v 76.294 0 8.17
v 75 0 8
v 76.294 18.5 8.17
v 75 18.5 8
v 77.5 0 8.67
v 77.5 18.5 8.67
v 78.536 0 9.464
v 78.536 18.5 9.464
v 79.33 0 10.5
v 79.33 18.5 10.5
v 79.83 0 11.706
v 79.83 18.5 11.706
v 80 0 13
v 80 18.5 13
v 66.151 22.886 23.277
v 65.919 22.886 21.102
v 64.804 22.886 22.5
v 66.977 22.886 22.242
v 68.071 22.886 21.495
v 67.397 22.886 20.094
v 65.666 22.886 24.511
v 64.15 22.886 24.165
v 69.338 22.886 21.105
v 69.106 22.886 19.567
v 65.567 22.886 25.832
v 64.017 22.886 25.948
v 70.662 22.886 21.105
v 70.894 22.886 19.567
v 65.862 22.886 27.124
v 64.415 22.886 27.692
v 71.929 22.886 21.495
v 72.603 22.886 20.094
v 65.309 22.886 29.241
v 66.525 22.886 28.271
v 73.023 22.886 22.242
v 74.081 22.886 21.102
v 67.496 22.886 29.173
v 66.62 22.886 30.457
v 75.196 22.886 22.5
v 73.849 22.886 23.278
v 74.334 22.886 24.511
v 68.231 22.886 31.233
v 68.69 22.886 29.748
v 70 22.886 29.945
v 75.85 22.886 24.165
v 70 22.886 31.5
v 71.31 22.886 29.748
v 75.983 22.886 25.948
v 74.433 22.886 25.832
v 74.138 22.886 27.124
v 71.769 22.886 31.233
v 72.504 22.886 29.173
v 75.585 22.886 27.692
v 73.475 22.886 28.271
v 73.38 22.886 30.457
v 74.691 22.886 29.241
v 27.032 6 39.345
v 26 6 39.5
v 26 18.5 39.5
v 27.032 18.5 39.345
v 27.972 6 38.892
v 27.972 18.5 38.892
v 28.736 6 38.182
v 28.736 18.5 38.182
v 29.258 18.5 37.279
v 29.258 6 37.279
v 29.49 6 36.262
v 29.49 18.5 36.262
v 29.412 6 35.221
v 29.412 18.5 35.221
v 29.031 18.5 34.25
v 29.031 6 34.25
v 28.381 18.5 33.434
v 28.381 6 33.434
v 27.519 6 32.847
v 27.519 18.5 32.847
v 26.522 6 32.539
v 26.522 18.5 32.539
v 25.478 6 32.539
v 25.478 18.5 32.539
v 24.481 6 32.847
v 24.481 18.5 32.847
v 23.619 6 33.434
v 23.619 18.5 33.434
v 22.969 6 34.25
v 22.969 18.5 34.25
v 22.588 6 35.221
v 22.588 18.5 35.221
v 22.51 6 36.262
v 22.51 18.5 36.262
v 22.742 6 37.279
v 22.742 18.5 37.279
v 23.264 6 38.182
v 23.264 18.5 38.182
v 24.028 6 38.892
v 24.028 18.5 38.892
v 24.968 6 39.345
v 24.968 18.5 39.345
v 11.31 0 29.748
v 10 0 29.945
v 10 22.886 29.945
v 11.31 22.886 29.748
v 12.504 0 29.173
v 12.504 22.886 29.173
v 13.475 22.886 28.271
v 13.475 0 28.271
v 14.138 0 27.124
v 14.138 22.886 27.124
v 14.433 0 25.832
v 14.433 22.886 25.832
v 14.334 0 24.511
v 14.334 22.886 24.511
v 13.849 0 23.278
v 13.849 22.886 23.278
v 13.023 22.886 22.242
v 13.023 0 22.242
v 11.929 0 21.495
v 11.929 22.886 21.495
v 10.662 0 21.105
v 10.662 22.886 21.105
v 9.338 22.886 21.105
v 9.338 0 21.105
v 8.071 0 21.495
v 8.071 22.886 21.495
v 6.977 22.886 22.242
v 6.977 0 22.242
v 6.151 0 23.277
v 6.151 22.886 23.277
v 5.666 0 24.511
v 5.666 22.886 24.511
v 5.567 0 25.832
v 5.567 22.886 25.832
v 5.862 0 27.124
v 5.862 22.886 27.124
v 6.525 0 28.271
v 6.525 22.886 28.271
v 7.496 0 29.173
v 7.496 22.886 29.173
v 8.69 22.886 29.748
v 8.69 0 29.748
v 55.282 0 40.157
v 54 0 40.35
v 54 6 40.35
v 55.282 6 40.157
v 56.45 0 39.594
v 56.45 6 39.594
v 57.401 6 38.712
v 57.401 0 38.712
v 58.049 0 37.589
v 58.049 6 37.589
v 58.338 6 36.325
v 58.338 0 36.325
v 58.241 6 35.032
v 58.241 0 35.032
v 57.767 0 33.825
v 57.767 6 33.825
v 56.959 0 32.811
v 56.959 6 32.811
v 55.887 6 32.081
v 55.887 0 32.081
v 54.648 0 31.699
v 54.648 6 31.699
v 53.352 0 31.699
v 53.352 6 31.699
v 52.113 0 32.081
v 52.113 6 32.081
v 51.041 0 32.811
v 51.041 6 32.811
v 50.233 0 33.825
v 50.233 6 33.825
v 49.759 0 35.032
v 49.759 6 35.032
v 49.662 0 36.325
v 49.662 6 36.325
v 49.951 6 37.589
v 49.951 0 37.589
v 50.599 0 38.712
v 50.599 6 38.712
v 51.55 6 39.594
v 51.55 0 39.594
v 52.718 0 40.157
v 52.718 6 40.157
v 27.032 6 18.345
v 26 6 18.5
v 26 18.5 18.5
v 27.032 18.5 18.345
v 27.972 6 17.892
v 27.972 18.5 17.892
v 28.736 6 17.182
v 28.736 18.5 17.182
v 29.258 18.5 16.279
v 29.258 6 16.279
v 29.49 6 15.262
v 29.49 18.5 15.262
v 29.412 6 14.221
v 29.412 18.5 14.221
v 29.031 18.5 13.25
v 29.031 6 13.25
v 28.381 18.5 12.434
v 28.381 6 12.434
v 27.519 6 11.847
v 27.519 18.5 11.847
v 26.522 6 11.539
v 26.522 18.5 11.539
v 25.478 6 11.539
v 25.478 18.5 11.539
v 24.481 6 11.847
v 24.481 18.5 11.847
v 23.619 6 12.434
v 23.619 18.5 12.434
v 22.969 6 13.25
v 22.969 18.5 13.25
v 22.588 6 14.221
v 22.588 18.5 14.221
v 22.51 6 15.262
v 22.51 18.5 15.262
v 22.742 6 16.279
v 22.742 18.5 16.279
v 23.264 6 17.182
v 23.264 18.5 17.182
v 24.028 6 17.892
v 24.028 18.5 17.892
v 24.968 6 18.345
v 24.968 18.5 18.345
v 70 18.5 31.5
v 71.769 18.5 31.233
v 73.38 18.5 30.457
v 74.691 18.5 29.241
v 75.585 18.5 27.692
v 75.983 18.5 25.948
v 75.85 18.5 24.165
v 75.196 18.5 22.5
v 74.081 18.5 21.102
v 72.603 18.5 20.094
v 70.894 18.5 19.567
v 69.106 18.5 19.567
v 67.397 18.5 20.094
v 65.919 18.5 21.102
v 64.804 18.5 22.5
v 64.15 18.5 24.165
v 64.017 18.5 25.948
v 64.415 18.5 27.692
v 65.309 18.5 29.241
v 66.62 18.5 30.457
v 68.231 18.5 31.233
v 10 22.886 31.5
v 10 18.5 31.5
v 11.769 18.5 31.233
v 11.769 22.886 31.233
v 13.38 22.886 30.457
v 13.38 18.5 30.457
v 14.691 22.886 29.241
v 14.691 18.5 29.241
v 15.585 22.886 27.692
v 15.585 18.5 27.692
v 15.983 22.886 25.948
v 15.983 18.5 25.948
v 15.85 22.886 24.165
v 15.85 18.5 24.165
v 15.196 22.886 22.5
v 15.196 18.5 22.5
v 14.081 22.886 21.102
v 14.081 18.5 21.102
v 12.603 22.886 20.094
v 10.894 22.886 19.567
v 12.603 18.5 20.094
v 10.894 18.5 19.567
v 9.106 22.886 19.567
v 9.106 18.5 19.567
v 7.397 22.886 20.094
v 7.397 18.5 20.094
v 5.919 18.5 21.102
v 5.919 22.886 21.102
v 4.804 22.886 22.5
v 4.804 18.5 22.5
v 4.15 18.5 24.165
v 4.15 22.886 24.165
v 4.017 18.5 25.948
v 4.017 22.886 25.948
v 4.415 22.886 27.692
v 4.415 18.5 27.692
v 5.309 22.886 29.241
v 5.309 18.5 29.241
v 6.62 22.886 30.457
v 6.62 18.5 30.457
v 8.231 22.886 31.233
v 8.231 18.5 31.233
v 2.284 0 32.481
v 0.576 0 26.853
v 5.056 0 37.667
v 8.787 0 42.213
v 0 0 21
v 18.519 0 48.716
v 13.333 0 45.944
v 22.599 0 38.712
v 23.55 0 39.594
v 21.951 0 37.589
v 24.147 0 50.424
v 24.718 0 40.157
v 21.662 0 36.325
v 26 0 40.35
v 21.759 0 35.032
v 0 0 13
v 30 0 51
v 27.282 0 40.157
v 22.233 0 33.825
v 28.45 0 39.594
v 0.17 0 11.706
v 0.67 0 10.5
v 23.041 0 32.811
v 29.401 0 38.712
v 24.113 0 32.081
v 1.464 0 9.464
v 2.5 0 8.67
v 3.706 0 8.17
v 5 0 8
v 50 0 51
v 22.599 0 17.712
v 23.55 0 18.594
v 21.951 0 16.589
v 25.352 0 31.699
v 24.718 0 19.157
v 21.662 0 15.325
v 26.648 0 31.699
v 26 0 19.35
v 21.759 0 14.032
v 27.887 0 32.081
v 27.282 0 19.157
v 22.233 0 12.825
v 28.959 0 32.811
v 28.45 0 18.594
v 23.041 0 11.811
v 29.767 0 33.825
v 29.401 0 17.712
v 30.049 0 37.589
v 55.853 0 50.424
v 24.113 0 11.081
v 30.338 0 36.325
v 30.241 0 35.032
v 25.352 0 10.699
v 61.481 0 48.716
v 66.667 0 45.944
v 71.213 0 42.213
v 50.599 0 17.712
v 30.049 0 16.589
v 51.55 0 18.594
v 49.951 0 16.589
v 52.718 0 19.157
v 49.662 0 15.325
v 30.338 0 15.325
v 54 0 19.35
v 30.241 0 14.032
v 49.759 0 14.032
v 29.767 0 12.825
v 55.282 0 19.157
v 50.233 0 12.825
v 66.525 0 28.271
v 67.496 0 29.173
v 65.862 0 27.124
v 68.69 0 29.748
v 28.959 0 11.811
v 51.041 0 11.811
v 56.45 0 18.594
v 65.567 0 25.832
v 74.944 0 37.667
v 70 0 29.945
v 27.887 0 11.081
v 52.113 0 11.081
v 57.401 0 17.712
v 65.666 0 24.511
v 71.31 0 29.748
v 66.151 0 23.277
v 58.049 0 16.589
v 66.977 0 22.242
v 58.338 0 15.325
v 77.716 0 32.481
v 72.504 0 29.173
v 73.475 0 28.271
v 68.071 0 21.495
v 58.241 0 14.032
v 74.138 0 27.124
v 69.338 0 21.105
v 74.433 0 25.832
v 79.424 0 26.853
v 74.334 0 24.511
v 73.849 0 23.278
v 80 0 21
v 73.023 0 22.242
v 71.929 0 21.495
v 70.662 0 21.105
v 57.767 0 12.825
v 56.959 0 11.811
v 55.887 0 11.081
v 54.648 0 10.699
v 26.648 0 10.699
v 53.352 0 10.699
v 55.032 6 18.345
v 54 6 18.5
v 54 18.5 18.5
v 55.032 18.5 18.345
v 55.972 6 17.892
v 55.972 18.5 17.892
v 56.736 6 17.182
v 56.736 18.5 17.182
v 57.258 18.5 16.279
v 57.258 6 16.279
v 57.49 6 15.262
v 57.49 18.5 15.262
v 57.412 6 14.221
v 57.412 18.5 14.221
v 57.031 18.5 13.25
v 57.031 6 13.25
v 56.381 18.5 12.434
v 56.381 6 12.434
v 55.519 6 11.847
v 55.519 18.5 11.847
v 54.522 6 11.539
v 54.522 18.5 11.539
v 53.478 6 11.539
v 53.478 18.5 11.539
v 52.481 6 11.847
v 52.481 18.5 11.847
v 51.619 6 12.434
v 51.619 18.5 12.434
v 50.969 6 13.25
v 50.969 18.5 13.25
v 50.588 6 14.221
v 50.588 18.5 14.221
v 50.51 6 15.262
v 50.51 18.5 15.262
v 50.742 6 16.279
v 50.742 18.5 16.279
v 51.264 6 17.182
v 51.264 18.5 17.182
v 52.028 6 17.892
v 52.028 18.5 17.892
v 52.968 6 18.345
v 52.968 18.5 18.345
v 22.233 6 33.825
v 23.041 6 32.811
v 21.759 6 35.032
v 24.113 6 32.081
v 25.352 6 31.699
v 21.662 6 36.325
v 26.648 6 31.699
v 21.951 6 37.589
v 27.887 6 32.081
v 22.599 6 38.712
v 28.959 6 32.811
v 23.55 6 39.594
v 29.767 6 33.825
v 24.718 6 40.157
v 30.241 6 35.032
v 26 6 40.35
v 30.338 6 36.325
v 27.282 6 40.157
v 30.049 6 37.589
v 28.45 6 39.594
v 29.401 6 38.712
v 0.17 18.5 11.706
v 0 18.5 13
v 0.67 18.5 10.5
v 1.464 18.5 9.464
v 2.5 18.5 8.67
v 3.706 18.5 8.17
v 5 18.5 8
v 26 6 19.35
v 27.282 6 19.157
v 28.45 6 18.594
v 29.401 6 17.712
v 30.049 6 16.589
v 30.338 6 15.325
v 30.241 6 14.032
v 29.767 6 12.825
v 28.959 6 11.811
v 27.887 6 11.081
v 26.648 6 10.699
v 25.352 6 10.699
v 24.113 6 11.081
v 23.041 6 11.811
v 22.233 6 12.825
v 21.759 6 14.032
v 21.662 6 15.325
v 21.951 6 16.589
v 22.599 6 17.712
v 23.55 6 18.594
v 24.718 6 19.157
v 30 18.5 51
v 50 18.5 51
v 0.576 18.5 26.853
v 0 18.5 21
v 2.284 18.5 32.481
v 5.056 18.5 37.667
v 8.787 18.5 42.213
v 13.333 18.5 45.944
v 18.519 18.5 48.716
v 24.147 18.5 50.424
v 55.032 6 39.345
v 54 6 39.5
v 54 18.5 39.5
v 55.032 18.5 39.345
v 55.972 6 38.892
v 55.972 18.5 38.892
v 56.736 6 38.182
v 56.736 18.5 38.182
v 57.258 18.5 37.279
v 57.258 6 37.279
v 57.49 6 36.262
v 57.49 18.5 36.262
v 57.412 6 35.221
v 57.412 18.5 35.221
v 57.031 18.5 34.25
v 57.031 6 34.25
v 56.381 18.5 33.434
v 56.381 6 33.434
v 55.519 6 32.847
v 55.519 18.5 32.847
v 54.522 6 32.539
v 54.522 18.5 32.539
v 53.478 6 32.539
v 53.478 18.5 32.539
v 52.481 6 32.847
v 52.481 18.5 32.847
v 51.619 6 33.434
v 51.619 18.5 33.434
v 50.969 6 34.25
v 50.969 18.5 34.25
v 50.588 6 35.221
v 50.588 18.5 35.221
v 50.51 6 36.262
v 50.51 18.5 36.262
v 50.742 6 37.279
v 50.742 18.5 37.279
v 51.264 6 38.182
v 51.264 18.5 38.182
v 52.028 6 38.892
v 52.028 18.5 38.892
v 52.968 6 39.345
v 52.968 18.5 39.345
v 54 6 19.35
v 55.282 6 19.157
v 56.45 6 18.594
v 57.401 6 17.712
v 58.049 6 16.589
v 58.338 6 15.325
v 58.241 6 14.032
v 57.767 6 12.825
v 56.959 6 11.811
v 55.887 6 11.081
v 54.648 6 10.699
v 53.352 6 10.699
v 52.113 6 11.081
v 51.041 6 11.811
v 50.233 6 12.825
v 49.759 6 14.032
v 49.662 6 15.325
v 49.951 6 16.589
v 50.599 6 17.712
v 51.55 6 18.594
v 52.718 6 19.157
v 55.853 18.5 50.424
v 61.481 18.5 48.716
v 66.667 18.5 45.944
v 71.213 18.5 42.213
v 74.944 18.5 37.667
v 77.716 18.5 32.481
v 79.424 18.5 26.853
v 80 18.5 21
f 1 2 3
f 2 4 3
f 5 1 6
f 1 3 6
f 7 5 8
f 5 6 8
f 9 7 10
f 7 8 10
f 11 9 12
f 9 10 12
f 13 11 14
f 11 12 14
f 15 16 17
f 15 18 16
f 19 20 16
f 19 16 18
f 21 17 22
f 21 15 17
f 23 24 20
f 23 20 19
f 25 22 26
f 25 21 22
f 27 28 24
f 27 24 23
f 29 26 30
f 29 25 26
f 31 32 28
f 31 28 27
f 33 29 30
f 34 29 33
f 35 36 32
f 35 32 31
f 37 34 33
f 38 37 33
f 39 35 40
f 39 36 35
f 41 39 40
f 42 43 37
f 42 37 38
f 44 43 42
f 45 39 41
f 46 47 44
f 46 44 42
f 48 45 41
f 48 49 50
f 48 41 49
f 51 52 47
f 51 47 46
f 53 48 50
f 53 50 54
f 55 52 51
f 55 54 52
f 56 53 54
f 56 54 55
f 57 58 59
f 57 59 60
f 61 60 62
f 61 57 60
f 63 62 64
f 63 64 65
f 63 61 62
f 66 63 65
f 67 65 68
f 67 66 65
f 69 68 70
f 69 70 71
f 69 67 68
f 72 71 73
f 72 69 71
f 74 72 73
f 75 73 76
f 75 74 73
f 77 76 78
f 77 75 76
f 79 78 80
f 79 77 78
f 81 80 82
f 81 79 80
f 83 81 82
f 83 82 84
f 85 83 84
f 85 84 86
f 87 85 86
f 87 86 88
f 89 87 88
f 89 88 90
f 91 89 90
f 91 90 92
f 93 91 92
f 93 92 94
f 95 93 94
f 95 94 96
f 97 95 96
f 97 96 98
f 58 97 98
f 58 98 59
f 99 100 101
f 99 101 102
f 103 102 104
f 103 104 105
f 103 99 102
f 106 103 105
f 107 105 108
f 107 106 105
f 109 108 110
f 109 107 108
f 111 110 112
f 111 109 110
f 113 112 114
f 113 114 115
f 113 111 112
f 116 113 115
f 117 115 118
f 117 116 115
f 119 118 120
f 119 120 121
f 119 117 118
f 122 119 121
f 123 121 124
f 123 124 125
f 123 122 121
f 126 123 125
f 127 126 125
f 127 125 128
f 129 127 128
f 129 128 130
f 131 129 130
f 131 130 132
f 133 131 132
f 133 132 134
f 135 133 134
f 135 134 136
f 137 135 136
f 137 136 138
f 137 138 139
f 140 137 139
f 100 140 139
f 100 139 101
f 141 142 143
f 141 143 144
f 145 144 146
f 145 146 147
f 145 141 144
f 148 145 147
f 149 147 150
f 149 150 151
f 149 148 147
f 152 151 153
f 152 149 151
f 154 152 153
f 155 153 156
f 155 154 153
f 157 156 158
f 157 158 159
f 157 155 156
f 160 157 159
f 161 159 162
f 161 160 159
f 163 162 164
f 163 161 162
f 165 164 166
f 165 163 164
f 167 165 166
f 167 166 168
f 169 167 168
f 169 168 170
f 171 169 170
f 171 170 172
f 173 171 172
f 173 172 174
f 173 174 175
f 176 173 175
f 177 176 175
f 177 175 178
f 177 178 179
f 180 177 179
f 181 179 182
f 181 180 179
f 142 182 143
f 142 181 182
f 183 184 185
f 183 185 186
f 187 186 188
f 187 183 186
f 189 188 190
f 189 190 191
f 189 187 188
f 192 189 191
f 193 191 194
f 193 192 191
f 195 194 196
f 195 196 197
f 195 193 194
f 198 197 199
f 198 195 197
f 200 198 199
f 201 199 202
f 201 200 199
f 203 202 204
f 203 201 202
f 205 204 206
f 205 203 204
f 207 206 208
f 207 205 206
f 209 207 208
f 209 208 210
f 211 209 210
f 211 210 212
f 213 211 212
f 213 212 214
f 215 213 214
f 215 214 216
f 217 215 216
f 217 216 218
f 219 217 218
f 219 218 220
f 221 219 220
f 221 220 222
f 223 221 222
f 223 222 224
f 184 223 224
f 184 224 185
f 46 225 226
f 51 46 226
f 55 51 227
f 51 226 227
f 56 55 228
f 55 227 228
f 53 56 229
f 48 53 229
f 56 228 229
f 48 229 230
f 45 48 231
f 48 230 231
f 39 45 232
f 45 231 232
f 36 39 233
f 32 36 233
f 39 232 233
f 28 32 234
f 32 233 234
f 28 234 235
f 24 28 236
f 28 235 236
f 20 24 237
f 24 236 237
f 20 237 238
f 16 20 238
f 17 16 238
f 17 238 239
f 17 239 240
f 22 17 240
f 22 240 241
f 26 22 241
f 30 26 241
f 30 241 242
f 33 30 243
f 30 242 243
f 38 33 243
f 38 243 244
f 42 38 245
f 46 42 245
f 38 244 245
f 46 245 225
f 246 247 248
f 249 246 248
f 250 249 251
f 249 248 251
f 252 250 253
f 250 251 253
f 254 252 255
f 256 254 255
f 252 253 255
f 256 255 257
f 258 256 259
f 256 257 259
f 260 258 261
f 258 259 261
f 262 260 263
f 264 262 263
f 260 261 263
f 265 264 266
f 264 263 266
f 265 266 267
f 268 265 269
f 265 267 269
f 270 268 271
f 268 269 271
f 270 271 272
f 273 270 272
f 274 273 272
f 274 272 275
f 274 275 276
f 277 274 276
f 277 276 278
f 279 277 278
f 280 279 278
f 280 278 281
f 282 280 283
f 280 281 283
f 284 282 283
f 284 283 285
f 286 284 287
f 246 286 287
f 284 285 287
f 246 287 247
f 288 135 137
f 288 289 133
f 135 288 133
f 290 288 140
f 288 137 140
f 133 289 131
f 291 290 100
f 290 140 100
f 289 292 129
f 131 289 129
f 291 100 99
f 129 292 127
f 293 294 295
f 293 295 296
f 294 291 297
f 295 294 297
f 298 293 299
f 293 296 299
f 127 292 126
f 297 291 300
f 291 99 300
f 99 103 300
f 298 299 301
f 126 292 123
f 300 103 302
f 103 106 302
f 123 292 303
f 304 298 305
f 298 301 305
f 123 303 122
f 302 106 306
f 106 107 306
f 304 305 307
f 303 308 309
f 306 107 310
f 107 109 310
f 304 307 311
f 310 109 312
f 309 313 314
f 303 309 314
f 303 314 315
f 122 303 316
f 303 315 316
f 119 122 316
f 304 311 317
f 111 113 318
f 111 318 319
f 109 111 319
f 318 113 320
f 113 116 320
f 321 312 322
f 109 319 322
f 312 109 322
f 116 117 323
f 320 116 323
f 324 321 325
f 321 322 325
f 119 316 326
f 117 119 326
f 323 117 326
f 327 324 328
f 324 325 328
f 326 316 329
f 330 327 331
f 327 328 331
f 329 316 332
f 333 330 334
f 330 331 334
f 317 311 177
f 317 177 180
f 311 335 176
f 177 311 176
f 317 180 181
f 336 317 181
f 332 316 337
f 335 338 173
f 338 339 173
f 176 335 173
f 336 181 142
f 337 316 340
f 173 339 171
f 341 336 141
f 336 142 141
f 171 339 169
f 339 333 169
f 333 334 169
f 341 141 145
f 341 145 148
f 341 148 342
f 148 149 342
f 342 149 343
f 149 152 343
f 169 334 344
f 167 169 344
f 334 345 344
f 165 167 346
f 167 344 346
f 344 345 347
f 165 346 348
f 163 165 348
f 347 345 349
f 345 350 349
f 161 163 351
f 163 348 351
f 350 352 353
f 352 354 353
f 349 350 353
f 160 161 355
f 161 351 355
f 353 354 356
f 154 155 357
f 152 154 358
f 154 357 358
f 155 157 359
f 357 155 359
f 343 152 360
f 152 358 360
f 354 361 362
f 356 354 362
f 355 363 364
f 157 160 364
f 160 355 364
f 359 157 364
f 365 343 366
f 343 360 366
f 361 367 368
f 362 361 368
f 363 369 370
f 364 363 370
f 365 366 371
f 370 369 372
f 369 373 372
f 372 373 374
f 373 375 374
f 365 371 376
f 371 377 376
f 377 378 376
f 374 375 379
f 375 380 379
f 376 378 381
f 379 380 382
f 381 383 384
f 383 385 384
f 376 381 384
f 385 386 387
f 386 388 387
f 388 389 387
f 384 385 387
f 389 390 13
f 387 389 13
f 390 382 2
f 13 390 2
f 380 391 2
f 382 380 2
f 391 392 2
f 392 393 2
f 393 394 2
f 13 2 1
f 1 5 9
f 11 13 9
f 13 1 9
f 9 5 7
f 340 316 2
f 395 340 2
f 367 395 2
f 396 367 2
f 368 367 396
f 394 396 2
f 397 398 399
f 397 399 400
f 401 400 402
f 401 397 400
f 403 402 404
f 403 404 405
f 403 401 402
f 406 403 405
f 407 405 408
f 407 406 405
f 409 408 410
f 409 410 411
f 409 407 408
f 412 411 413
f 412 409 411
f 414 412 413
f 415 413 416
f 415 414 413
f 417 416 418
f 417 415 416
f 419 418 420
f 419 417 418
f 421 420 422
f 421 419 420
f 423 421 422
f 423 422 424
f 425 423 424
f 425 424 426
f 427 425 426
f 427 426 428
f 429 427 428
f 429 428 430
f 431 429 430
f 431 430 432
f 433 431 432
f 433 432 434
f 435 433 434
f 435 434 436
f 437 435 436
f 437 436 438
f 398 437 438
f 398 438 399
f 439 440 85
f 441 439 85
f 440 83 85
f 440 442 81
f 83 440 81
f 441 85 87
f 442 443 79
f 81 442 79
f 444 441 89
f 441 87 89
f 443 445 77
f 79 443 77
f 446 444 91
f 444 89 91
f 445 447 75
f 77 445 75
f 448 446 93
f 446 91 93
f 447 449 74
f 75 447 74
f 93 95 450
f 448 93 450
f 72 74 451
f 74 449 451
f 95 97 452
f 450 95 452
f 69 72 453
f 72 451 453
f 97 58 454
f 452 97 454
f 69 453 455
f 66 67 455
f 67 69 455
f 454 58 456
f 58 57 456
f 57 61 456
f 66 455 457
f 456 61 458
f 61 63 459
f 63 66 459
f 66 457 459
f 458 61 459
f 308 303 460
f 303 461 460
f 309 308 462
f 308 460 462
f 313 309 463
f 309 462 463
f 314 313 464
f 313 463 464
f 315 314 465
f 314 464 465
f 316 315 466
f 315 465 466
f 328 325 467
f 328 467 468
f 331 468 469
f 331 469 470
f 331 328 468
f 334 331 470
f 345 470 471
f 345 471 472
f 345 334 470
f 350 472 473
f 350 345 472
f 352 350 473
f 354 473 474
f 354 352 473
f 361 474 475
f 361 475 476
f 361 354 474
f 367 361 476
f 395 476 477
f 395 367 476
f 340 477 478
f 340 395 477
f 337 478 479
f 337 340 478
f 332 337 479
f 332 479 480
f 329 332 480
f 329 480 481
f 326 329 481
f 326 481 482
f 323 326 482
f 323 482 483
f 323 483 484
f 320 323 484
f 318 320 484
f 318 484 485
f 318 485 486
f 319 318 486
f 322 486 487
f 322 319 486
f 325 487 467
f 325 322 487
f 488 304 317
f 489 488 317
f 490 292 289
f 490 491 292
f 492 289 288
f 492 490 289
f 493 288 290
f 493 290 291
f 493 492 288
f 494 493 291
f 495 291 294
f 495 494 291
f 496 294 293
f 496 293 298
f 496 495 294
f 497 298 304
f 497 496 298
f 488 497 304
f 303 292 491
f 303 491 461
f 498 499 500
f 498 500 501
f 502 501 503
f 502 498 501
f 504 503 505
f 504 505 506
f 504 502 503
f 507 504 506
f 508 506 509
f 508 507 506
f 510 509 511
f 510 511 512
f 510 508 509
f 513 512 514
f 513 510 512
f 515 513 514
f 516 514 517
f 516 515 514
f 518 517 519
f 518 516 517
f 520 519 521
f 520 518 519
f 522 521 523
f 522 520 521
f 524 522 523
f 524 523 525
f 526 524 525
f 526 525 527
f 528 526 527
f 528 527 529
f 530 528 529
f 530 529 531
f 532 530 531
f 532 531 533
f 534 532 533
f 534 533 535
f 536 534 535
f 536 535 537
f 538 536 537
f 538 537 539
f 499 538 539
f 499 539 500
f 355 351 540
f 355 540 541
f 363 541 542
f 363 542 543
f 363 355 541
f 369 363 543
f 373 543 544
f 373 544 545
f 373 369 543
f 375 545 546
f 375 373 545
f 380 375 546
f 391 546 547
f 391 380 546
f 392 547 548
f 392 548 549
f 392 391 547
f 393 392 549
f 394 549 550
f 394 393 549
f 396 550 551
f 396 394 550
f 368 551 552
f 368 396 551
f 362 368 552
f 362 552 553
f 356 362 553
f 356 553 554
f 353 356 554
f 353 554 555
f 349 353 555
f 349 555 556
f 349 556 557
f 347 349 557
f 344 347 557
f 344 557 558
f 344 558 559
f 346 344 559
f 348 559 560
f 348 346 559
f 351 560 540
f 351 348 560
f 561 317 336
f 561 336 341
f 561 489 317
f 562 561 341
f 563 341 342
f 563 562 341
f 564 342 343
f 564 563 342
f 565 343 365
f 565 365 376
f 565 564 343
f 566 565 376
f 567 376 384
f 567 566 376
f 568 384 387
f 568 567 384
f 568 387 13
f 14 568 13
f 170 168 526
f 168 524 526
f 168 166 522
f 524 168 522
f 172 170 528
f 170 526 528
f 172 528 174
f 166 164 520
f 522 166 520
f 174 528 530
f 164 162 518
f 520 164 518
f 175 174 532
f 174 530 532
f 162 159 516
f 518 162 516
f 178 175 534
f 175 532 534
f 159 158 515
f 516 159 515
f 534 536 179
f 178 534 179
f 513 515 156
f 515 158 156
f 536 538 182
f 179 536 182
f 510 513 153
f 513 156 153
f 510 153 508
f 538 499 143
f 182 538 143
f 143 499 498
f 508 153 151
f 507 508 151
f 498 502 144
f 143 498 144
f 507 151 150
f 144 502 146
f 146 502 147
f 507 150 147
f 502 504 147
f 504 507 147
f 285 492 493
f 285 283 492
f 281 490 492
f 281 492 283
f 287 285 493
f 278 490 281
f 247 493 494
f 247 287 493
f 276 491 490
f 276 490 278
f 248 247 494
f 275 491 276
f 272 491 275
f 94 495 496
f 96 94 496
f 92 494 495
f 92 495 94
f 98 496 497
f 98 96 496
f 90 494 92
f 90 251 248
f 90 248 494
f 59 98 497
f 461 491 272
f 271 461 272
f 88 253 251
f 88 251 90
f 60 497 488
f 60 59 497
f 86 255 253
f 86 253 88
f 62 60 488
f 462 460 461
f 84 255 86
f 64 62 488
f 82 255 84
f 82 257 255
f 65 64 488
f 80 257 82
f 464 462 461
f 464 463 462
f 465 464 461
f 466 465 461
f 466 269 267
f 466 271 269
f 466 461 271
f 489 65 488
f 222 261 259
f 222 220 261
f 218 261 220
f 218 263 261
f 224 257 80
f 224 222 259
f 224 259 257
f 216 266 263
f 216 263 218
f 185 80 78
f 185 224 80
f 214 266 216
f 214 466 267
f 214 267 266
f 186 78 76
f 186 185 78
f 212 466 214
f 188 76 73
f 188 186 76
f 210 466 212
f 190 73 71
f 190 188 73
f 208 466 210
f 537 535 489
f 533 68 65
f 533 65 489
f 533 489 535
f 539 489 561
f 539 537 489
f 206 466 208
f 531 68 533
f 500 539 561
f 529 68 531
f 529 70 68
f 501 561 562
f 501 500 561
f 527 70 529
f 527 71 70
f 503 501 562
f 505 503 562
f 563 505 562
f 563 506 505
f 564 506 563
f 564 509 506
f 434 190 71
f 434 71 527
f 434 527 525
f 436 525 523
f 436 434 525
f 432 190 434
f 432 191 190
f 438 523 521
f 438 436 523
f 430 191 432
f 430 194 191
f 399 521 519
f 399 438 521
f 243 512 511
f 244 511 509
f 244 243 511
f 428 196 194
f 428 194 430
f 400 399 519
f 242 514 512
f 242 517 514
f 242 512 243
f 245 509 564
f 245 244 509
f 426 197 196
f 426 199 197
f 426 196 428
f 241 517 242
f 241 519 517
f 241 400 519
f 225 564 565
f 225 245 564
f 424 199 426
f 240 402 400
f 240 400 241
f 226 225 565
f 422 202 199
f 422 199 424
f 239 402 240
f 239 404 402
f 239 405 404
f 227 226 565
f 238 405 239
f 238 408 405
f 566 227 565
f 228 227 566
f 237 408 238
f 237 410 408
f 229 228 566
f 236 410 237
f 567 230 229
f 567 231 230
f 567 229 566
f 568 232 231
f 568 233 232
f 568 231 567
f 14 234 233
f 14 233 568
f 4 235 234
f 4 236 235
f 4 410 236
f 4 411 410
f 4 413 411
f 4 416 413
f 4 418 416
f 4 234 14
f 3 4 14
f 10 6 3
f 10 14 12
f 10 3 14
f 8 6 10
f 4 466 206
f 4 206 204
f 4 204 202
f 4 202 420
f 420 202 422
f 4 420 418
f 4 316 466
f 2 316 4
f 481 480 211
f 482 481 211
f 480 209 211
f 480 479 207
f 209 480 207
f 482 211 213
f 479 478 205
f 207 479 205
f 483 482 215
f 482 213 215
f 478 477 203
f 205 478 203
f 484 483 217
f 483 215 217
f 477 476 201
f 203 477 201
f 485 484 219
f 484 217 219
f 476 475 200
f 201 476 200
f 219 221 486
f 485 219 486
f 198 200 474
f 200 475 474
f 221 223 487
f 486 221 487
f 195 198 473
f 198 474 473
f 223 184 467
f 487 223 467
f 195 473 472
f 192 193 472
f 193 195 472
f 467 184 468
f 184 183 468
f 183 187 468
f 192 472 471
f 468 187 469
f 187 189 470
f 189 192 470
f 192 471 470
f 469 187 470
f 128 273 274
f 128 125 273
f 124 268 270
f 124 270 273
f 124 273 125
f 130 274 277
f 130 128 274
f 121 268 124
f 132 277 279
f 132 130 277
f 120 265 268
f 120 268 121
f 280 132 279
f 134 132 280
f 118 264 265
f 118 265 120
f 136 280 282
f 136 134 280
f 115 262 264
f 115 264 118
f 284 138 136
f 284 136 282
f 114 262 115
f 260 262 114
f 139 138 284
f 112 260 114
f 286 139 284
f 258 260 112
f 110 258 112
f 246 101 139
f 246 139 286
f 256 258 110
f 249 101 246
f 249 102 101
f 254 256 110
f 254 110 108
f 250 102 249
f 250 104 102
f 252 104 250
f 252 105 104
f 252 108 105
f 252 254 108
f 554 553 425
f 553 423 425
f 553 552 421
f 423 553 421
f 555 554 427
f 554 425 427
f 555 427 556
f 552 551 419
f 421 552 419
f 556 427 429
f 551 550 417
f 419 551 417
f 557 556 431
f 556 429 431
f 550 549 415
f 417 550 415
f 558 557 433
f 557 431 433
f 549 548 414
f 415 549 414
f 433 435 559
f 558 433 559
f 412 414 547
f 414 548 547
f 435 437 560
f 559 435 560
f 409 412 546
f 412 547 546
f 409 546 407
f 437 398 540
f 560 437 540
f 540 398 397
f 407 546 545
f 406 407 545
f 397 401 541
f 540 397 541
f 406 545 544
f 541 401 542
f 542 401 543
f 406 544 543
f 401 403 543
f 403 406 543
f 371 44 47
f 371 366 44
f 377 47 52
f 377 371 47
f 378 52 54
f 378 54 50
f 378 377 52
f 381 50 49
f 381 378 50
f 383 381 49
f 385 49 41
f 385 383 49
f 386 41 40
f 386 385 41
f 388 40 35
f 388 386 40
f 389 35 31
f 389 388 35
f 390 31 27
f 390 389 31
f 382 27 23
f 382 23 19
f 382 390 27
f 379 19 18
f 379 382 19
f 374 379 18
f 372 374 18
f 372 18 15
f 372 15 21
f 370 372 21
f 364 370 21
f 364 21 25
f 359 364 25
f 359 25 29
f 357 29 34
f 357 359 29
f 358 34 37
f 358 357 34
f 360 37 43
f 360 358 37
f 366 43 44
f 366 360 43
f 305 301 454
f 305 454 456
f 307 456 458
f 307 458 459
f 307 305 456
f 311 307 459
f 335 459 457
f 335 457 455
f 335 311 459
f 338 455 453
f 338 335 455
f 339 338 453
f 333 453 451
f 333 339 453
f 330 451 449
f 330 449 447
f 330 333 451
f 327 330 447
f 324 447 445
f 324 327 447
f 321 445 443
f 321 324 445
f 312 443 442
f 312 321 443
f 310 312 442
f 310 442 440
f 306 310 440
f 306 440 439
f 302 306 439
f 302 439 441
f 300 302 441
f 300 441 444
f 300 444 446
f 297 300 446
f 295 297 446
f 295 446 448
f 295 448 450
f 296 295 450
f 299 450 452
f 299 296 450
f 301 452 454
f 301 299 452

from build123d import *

# Parameters (mm, degrees)
SKETCH1_W           = 80
SKETCH1_H           = 43
SKETCH1_R           = 3.5
SKETCH1_R_2         = 4.445
BOSS_EXTRUDE1_DEPTH = 18.5
SKETCH1_4_R         = 4.35
SKETCH1_4_R_2       = 3.5
CUT_EXTRUDE1_DEPTH  = 6
FILLET1_R           = 30
FILLET2_R           = 5
BOSS_EXTRUDE2_START = 18.5
SKETCH1_5_R         = 6
SKETCH1_5_R_2       = 4.445
BOSS_EXTRUDE2_DEPTH = 4.3864


with BuildPart() as part:
    # Sketch1 → Boss-Extrude1 (new body)
    with BuildSketch(Plane(origin=(0, 0, 0), x_dir=(1, 0, 0), z_dir=(0, 1, 0))):
        with Locations((40, -29.5)):
            Rectangle(SKETCH1_W, SKETCH1_H)
        with Locations((26, -36)):
            Circle(SKETCH1_R, mode=Mode.SUBTRACT)
        with Locations((54, -36)):
            Circle(SKETCH1_R, mode=Mode.SUBTRACT)
        with Locations((26, -15)):
            Circle(SKETCH1_R, mode=Mode.SUBTRACT)
        with Locations((54, -15)):
            Circle(SKETCH1_R, mode=Mode.SUBTRACT)
        with Locations((70, -25.5)):
            Circle(SKETCH1_R_2, mode=Mode.SUBTRACT)
        with Locations((10, -25.5)):
            Circle(SKETCH1_R_2, mode=Mode.SUBTRACT)
    extrude(amount=BOSS_EXTRUDE1_DEPTH)

    # Sketch1<4> → Cut-Extrude1 (cut)
    # profile 1 of 4: a face of its own
    with BuildSketch(Plane(origin=(0, 0, 0), x_dir=(1, 0, 0), z_dir=(0, 1, 0))):
        with Locations((26, -15)):
            Circle(SKETCH1_4_R)
        with Locations((26, -15)):
            Circle(SKETCH1_4_R_2, mode=Mode.SUBTRACT)
    # profile 2 of 4: a face of its own
    with BuildSketch(Plane(origin=(0, 0, 0), x_dir=(1, 0, 0), z_dir=(0, 1, 0))):
        with Locations((54, -15)):
            Circle(SKETCH1_4_R)
        with Locations((54, -15)):
            Circle(SKETCH1_4_R_2, mode=Mode.SUBTRACT)
    # profile 3 of 4: a face of its own
    with BuildSketch(Plane(origin=(0, 0, 0), x_dir=(1, 0, 0), z_dir=(0, 1, 0))):
        with Locations((26, -36)):
            Circle(SKETCH1_4_R)
        with Locations((26, -36)):
            Circle(SKETCH1_4_R_2, mode=Mode.SUBTRACT)
    # profile 4 of 4: a face of its own
    with BuildSketch(Plane(origin=(0, 0, 0), x_dir=(1, 0, 0), z_dir=(0, 1, 0))):
        with Locations((54, -36)):
            Circle(SKETCH1_4_R)
        with Locations((54, -36)):
            Circle(SKETCH1_4_R_2, mode=Mode.SUBTRACT)
    extrude(amount=CUT_EXTRUDE1_DEPTH, mode=Mode.SUBTRACT)

    # Fillet1
    fillet1_edges = [part.edges().sort_by_distance(p)[0] for p in [
        (80, 9.25, 51),
        (0, 9.25, 51),
    ]]
    fillet(fillet1_edges, radius=FILLET1_R)

    # Fillet2
    fillet2_edges = [part.edges().sort_by_distance(p)[0] for p in [
        (0, 9.25, 8),
        (80, 9.25, 8),
    ]]
    fillet(fillet2_edges, radius=FILLET2_R)

    # Sketch1<5> → Boss-Extrude2 (add)
    # profile 1 of 2: a face of its own
    with BuildSketch(Plane(origin=(0, 0, 0), x_dir=(1, 0, 0), z_dir=(0, 1, 0)).offset(BOSS_EXTRUDE2_START)):
        with Locations((70, -25.5)):
            Circle(SKETCH1_5_R)
        with Locations((70, -25.5)):
            Circle(SKETCH1_5_R_2, mode=Mode.SUBTRACT)
    # profile 2 of 2: a face of its own
    with BuildSketch(Plane(origin=(0, 0, 0), x_dir=(1, 0, 0), z_dir=(0, 1, 0)).offset(BOSS_EXTRUDE2_START)):
        with Locations((10, -25.5)):
            Circle(SKETCH1_5_R)
        with Locations((10, -25.5)):
            Circle(SKETCH1_5_R_2, mode=Mode.SUBTRACT)
    extrude(amount=BOSS_EXTRUDE2_DEPTH)


solid = part.part
